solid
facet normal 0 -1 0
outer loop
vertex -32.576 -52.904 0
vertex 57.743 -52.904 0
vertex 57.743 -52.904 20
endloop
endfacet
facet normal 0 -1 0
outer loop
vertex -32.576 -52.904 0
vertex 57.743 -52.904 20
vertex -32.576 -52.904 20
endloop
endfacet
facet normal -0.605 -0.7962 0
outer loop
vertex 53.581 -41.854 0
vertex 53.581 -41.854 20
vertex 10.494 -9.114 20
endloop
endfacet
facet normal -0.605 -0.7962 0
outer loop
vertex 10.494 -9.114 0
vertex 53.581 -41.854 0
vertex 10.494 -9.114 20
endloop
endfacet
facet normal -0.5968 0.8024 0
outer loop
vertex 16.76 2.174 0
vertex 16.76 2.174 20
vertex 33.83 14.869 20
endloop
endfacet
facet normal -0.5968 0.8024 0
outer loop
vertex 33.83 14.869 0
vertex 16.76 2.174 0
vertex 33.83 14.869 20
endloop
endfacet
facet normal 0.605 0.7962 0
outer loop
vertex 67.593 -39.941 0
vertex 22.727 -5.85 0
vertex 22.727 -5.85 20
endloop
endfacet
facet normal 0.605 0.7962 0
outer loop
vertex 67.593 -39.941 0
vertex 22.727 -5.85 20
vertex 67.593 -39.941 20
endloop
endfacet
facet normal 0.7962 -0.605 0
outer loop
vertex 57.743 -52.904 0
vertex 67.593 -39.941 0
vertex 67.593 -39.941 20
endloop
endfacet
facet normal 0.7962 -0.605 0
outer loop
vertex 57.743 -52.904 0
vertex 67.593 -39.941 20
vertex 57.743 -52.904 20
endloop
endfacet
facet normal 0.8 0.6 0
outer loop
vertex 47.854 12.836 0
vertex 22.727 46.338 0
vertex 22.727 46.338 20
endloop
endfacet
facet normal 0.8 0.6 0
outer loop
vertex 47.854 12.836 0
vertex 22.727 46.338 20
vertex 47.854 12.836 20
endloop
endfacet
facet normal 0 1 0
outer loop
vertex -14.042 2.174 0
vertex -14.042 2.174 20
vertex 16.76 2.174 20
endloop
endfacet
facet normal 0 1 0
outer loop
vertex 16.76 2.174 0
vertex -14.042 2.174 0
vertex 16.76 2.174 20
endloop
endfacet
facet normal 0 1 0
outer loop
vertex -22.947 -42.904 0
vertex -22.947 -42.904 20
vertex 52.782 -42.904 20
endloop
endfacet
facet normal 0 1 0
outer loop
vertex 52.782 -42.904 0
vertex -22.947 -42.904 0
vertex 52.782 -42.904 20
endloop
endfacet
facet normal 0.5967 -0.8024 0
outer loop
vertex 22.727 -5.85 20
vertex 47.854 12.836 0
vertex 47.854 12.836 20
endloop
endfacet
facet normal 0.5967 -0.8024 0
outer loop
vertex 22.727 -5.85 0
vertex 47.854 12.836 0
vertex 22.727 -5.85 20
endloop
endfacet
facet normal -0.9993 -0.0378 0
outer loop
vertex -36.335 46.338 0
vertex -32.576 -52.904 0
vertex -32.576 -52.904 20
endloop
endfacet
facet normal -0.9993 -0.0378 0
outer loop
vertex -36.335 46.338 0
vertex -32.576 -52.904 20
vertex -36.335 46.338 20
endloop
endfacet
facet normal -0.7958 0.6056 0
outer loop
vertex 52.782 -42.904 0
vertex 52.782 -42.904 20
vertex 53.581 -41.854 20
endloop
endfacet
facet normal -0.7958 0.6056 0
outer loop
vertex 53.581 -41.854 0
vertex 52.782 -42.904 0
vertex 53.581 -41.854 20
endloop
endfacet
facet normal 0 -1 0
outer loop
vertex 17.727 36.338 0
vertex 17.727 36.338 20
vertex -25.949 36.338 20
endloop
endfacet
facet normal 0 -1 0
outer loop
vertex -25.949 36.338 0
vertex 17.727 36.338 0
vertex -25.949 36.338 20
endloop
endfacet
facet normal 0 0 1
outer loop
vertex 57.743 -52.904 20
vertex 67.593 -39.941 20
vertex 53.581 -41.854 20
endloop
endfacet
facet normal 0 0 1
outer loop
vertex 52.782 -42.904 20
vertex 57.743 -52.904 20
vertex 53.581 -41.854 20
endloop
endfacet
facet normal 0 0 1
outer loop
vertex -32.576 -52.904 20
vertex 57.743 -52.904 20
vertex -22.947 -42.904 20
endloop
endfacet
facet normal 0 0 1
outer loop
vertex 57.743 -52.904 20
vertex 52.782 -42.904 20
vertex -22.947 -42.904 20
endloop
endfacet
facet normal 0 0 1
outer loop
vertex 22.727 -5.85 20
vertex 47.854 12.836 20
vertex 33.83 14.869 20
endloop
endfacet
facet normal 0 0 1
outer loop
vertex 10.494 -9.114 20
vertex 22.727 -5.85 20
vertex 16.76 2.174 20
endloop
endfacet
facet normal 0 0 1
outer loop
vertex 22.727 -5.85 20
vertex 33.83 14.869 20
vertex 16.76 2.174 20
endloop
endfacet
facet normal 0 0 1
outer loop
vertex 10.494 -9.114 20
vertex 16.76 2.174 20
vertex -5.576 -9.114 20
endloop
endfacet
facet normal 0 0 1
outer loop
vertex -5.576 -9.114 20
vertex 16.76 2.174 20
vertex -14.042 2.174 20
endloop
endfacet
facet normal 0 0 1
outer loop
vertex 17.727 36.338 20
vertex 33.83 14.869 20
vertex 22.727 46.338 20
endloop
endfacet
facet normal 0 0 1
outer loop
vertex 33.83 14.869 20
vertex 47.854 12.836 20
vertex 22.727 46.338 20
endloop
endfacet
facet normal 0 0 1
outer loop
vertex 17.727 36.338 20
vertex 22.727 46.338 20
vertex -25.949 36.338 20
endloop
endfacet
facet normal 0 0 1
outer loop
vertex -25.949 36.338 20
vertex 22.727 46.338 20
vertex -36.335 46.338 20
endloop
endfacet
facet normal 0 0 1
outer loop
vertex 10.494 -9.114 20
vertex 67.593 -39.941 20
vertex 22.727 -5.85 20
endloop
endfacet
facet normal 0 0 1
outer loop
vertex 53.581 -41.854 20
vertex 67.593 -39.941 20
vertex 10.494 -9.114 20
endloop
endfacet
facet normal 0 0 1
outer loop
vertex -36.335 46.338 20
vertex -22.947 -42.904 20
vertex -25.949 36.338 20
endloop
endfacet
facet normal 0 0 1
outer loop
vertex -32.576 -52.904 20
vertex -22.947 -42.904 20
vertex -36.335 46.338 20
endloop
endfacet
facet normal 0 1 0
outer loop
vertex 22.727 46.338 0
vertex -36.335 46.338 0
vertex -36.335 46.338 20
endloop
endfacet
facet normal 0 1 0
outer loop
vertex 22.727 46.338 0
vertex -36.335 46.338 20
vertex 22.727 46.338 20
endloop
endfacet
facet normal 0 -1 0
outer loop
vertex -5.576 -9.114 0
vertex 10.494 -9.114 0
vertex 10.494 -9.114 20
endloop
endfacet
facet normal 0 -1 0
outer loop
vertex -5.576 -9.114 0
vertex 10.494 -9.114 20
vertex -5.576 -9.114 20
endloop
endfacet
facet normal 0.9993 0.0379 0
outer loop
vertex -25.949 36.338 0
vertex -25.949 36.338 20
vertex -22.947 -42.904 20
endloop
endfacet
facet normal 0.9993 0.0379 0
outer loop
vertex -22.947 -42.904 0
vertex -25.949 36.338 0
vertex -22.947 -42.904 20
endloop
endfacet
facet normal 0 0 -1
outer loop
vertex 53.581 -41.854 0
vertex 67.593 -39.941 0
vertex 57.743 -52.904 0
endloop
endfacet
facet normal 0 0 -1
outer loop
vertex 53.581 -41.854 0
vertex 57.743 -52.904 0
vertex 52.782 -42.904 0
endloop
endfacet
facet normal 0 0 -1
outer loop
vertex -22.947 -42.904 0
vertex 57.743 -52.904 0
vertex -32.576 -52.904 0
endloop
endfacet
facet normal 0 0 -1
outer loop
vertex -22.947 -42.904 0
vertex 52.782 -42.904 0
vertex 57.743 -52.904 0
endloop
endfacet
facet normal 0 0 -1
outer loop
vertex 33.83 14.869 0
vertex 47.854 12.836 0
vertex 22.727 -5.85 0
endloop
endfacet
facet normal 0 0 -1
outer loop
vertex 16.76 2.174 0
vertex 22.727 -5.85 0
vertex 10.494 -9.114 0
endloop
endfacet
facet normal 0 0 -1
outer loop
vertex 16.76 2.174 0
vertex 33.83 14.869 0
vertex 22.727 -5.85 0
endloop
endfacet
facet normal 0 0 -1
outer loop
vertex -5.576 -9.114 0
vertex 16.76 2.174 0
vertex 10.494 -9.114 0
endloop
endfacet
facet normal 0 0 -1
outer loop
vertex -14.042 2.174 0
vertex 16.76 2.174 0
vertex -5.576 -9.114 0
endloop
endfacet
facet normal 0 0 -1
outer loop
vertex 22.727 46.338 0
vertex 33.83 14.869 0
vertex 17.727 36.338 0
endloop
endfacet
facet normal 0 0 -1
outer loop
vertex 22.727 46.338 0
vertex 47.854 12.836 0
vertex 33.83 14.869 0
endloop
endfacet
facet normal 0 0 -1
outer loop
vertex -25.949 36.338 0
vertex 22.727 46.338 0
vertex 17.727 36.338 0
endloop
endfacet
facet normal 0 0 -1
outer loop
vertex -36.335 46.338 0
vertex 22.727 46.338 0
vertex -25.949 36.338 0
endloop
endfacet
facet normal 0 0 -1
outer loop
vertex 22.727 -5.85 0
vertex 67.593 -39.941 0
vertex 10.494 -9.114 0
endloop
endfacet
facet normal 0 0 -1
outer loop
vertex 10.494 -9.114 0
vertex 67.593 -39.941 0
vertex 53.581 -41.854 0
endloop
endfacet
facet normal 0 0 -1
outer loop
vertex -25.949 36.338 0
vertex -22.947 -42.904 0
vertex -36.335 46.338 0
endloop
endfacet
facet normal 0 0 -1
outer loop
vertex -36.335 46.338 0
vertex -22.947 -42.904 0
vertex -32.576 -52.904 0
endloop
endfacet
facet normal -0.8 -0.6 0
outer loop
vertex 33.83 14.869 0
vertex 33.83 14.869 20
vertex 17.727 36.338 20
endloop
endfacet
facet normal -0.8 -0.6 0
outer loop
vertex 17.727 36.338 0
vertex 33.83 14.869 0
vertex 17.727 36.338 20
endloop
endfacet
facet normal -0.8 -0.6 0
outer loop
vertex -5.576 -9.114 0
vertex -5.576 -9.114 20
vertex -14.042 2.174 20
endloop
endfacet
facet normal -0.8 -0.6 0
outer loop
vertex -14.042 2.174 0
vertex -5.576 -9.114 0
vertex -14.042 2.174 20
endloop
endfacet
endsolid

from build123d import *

# Parameters (mm, degrees)
BOSS_EXTRUDE4_DEPTH = 20
CUT_EXTRUDE1_DEPTH  = 89.134124702


with BuildPart() as part:
    # Sketch1 → Boss-Extrude4 (new body)
    with BuildSketch(Plane.XY):
        Polygon((-32.575757576, -52.904040404), (-36.334940312, 46.338383838), (22.727272727, 46.338383838), (47.853859566, 12.836268054), (22.727272727, -5.850467639), (67.592798773, -39.94137673), (57.74316526, -52.904040404), align=None)
    extrude(amount=BOSS_EXTRUDE4_DEPTH)

    # Sketch3 → Cut-Extrude1 (cut, through all)
    with BuildSketch(Plane.XY.offset(20)):
        Polygon((10.494111386, -9.114469372), (-5.575689301, -9.114469372), (-14.041829745, 2.173717887), (16.759656232, 2.173717887), (33.829559486, 14.868668159), (17.727272727, 36.338383838), (-25.948980992, 36.338383838), (-22.947374013, -42.904040404), (52.782303891, -42.904040404), (53.580530259, -41.853530257), align=None)
    extrude(amount=-CUT_EXTRUDE1_DEPTH, mode=Mode.SUBTRACT)


solid = part.part
